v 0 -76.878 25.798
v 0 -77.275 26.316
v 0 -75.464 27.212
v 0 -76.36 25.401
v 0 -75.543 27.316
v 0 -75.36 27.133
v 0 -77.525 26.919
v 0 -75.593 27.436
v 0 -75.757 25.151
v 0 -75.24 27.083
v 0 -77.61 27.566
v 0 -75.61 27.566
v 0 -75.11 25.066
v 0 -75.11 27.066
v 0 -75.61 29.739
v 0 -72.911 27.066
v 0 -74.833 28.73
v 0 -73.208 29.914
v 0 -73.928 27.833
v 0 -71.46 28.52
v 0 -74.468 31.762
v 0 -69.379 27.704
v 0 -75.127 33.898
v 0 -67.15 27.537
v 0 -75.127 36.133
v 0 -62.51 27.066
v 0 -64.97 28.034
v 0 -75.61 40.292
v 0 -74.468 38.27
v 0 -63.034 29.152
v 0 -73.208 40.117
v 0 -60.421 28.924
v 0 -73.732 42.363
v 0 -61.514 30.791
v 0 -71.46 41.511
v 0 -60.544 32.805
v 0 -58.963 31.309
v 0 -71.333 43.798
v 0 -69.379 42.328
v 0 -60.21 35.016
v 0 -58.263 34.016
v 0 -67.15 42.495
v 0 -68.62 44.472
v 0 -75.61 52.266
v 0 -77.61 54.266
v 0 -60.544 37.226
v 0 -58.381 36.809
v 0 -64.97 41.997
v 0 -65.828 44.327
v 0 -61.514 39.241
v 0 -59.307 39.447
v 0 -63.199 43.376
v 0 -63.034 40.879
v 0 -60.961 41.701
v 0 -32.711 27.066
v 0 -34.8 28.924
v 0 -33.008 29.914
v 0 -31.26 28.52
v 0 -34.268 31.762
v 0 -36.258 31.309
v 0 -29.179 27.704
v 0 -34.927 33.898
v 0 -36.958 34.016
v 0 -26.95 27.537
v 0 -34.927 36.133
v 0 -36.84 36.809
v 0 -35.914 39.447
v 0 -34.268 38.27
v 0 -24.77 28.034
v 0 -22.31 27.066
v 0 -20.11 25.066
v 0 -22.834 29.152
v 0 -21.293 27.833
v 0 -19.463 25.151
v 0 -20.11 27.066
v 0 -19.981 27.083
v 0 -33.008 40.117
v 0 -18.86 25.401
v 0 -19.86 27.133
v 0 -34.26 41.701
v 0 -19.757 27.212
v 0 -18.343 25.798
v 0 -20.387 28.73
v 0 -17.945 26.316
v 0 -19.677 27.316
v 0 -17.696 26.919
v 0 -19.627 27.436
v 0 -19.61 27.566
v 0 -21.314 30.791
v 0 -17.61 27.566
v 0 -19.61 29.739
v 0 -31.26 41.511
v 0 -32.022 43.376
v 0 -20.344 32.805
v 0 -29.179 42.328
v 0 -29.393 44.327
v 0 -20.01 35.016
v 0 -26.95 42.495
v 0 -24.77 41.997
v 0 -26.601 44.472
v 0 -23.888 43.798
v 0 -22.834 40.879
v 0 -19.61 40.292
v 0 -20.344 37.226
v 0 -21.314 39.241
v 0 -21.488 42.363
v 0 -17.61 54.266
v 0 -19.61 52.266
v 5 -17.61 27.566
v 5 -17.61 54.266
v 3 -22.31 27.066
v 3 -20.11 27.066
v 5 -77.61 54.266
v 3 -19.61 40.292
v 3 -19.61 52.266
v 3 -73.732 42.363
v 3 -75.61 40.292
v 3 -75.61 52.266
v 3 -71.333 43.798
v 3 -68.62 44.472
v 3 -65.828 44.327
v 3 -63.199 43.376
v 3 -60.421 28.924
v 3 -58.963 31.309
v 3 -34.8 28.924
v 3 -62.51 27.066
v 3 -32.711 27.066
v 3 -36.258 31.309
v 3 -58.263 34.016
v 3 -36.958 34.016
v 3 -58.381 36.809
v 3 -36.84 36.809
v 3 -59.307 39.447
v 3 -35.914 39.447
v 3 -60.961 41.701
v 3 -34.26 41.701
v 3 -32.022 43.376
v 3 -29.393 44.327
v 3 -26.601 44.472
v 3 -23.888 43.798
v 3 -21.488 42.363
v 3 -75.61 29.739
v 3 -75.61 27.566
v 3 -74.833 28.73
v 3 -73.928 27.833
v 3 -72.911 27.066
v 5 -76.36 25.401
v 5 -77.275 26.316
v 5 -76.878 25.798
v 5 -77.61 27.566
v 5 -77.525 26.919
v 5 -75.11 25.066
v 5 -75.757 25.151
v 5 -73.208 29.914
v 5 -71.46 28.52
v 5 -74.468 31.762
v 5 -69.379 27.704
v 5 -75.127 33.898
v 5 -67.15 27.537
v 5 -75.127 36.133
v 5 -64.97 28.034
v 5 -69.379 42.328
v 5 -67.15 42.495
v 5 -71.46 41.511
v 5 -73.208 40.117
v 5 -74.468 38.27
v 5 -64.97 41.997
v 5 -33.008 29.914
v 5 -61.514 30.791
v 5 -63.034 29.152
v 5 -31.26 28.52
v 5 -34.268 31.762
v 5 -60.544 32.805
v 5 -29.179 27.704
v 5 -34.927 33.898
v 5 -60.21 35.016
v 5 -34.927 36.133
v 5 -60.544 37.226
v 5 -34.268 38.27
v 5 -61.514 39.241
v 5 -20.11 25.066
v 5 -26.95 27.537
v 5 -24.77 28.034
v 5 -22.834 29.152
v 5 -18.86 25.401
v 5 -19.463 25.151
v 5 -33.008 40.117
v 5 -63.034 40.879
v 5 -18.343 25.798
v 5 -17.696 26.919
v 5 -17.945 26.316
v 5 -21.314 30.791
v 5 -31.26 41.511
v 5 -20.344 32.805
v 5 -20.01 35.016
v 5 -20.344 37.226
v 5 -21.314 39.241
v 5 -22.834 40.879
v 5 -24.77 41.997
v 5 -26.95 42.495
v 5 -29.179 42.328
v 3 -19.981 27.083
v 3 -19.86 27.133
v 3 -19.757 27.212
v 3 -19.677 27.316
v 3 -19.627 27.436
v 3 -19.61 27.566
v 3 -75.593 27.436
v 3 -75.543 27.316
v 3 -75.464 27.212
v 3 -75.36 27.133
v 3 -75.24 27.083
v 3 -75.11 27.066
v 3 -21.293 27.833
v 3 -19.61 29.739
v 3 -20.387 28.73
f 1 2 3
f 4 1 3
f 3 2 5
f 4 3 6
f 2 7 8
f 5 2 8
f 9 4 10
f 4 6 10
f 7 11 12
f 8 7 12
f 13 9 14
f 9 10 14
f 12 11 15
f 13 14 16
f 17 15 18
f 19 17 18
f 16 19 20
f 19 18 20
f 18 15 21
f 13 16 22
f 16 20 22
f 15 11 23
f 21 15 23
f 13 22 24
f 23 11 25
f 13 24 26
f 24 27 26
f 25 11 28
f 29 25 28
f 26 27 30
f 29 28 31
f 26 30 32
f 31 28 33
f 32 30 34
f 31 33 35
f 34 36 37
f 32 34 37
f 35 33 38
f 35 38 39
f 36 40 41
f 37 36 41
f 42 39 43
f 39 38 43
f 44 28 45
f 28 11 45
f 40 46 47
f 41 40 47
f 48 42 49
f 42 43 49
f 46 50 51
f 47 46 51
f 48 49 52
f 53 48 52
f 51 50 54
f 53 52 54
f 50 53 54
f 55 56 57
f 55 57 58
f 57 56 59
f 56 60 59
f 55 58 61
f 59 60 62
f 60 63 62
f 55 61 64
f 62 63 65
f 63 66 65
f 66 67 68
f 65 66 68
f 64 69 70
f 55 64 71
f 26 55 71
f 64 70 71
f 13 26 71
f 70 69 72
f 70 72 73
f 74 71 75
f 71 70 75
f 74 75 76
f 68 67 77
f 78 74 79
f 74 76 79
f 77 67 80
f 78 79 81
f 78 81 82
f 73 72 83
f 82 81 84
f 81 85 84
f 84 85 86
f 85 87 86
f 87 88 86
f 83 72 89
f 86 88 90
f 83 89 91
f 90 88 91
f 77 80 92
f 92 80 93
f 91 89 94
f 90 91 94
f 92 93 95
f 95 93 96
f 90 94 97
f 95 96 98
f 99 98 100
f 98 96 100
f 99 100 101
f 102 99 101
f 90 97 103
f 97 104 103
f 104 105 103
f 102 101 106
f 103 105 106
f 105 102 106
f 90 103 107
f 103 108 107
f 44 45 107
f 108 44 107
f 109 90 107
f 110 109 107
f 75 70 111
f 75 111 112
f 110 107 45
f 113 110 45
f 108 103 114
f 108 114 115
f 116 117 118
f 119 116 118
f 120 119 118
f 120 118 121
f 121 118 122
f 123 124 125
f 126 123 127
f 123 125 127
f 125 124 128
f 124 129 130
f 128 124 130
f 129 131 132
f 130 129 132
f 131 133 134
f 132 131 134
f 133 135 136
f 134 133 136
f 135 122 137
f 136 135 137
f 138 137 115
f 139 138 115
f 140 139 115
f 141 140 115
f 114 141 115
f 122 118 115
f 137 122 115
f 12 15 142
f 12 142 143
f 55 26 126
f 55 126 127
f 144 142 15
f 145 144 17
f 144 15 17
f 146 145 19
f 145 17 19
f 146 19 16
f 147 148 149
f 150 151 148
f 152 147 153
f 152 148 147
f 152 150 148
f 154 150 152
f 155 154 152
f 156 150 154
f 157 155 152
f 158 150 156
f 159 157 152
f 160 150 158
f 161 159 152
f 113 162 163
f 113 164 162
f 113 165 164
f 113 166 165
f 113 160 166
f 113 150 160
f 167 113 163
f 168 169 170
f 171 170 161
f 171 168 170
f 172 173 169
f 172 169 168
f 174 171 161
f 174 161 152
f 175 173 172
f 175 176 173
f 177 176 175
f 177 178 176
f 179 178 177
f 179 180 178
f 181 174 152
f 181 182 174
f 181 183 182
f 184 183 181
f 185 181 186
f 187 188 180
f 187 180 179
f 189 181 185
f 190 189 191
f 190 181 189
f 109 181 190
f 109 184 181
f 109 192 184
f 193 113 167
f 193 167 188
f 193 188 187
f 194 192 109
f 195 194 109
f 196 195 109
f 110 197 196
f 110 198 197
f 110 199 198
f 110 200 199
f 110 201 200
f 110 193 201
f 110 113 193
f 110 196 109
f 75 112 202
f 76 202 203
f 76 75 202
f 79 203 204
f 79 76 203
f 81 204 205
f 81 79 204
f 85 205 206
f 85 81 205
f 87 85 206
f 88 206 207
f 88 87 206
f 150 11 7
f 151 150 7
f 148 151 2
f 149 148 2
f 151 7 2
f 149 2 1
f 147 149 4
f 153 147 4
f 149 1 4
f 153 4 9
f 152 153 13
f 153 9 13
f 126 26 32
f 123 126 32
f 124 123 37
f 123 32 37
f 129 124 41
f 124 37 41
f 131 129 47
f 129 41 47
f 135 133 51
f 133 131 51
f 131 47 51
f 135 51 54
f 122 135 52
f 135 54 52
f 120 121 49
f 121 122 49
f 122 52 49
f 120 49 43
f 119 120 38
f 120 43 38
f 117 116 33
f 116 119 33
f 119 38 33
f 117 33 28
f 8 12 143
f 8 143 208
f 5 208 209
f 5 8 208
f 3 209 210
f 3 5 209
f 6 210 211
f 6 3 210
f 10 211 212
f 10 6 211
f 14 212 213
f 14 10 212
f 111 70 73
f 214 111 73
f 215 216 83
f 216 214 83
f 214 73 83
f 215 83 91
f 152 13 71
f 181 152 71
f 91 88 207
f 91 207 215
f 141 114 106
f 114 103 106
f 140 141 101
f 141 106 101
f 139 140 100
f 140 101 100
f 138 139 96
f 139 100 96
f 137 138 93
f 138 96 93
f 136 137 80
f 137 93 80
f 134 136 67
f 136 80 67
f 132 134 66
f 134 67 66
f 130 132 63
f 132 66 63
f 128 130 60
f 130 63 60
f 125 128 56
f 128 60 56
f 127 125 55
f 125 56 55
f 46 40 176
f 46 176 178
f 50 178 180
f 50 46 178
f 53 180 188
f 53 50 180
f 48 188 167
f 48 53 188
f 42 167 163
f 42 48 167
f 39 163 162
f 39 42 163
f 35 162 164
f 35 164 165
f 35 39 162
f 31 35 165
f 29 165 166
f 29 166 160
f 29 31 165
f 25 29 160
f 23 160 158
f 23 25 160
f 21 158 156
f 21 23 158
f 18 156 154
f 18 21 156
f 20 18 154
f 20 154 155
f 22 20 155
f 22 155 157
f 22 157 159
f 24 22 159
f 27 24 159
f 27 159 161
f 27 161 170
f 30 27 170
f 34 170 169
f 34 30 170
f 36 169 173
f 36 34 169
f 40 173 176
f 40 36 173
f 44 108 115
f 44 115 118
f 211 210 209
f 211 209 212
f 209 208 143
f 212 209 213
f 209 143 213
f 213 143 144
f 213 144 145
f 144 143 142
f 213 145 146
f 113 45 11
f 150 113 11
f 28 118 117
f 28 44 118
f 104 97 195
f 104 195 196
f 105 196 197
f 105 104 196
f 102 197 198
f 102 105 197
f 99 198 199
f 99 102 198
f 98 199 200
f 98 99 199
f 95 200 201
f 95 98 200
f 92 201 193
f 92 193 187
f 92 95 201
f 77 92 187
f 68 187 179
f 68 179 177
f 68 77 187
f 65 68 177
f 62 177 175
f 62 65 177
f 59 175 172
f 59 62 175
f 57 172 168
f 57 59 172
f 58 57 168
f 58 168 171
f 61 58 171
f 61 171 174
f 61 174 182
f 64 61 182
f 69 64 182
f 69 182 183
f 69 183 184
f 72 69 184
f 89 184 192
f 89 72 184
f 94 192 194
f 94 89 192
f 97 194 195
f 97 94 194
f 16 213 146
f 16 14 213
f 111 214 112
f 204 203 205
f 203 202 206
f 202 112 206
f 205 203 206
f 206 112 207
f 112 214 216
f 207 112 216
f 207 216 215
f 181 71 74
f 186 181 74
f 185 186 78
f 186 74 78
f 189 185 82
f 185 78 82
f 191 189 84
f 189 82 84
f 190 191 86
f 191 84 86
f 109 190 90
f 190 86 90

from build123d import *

# Parameters (mm, degrees)
F0_W     = 13.5
F0_H     = 6.75
F1_DEPTH = 20
F2_W     = 8
F2_H     = 26.4694701647
F3_DEPTH = 12
F4_R     = 0.49999
F7_R     = 7.5
F8_DEPTH = 5
F9_T     = -2


# Not quite as in the source:
# - a fillet or chamfer is up to 0.001 mm smaller than in the source, because OpenCascade refuses the exact size
# - a feature of the source that left no trace in its solid (it failed there, or was rolled back) is left out


with BuildPart() as f1:
    # F0 (on Right) → F1 (new body)
    with BuildSketch(Plane.YZ):
        with BuildLine():
            Line((21.2005410668, -21.2570374378), (21.2005410668, 3.4429625622))
            Line((21.2005410668, 3.4429625622), (24.7505410668, 3.4429625622))
            Line((24.7505410668, 3.4429625622), (24.7505410668, -5.3425713437))
            Line((24.7505410668, -5.3425713437), (24.7505410668, -14.0570374378))
            ThreePointArc((24.7505410668, -14.0570374378), (25.4827741138, -15.8248043907), (27.2505410668, -16.5570374378))
            Line((27.2505410668, -16.5570374378), (31.4505410668, -16.5570374378))
            ThreePointArc((31.4505410668, -16.5570374378), (33.2183080197, -15.8248043907), (33.9505410668, -14.0570374378))
            Line((33.9505410668, -14.0570374378), (33.9505410668, -5.3425713437))
            Line((33.9505410668, -5.3425713437), (33.9505410668, 6.3718947504))
            ThreePointArc((33.9505410668, 6.3718947504), (34.4092996144, 7.8152704233), (35.6172077334, 8.7289173543))
            ThreePointArc((35.6172077334, 8.7289173543), (37.4860749727, 16.9784964681), (29.2364958588, 15.1096292289))
            ThreePointArc((29.2364958588, 15.1096292289), (28.3228489279, 13.9017211099), (26.8794732549, 13.4429625622))
            Line((26.8794732549, 13.4429625622), (15.2005410668, 13.4429625622))
            Line((15.2005410668, 13.4429625622), (-1.2994589332, 13.4429625622))
            ThreePointArc((-1.2994589332, 13.4429625622), (-3.0672258862, 12.7107295152), (-3.7994589332, 10.9429625622))
            Line((-3.7994589332, 10.9429625622), (-3.7994589332, 5.9429625622))
            ThreePointArc((-3.7994589332, 5.9429625622), (-3.0672258862, 4.1751956093), (-1.2994589332, 3.4429625622))
            Line((-1.2994589332, 3.4429625622), (5.1650071608, 3.4429625622))
            ThreePointArc((5.1650071608, 3.4429625622), (6.1217157417, 3.2526613935), (6.9327741138, 2.7107295152))
            Line((6.9327741138, 2.7107295152), (14.4934342856, -4.8499306566))
            Line((14.4934342856, -4.8499306566), (15.4683080197, -5.8248043907))
            ThreePointArc((15.4683080197, -5.8248043907), (16.010239898, -6.6358627628), (16.2005410668, -7.5925713437))
            Line((16.2005410668, -7.5925713437), (16.2005410668, -21.2570374378))
            ThreePointArc((16.2005410668, -21.2570374378), (16.4934342856, -21.964144219), (17.2005410668, -22.2570374378))
            Line((17.2005410668, -22.2570374378), (20.2005410668, -22.2570374378))
            ThreePointArc((20.2005410668, -22.2570374378), (20.9076478479, -21.964144219), (21.2005410668, -21.2570374378))
        make_face()
        with Locations((5.7005410668, 7.8179625622)):
            Rectangle(F0_W, F0_H, mode=Mode.SUBTRACT)
    extrude(amount=F1_DEPTH)

    # F2 (on face) → F3 (cut)
    with BuildSketch(Plane.YZ.offset(20)):
        with Locations((5.7005410668, 11.1929625622)):
            Rectangle(F2_W, F2_H)
    extrude(amount=-F3_DEPTH, mode=Mode.SUBTRACT)

    # F4 (radius 0.5 in the source; OpenCascade refuses exactly that, so slightly less here)
    f4_edges = [f1.edges().sort_by_distance(p)[0] for p in [
        (14, 1.700541, 11.192963),
        (14, 1.700541, 13.442963),
        (14, 1.700541, 4.442963),
        (14, 1.700541, 3.442963),
        (10, -1.049459, 4.442963),
        (10, -1.049459, 11.192963),
        (10, 12.450541, 11.192963),
        (10, 12.450541, 4.442963),
        (14, 9.700541, 11.192963),
        (14, 9.700541, 13.442963),
        (14, 9.700541, 4.442963),
    ]]
    fillet(f4_edges, radius=F4_R)


with BuildPart() as f8:
    # F7 (on Right) → F8 (new body)
    with BuildSketch(Plane.YZ):
        with BuildLine():
            Line((-17.6103499532, 45.065652512), (-22.6103499532, 45.065652512))
            Line((-22.6103499532, 45.065652512), (-72.6103499532, 45.065652512))
            Line((-72.6103499532, 45.065652512), (-77.6103499532, 45.065652512))
            Line((-77.6103499532, 45.065652512), (-77.6103499532, 27.565652512))
            ThreePointArc((-77.6103499532, 27.565652512), (-76.8781169061, 25.7978855591), (-75.1103499532, 25.065652512))
            Line((-75.1103499532, 25.065652512), (-20.1103499532, 25.065652512))
            ThreePointArc((-20.1103499532, 25.065652512), (-18.3425830002, 25.7978855591), (-17.6103499532, 27.565652512))
            Line((-17.6103499532, 27.565652512), (-17.6103499532, 45.065652512))
        make_face()
        with Locations((-67.7103499532, 35.015652512)):
            Circle(F7_R, mode=Mode.SUBTRACT)
        with Locations((-27.5103499532, 35.015652512)):
            Circle(F7_R, mode=Mode.SUBTRACT)
        Polygon((-72.6103499532, 45.065652512), (-22.6103499532, 45.065652512), (-17.6103499532, 45.065652512), (-17.6103499532, 54.265652512), (-77.6103499532, 54.265652512), (-77.6103499532, 45.065652512), align=None)
    extrude(amount=F8_DEPTH)

    # F9
    f9_openings = [f8.faces().sort_by_distance(p)[0] for p in [
        (0, -47.61035, 40.869984),
    ]]
    offset(amount=F9_T, openings=f9_openings)


solid = f8.part
